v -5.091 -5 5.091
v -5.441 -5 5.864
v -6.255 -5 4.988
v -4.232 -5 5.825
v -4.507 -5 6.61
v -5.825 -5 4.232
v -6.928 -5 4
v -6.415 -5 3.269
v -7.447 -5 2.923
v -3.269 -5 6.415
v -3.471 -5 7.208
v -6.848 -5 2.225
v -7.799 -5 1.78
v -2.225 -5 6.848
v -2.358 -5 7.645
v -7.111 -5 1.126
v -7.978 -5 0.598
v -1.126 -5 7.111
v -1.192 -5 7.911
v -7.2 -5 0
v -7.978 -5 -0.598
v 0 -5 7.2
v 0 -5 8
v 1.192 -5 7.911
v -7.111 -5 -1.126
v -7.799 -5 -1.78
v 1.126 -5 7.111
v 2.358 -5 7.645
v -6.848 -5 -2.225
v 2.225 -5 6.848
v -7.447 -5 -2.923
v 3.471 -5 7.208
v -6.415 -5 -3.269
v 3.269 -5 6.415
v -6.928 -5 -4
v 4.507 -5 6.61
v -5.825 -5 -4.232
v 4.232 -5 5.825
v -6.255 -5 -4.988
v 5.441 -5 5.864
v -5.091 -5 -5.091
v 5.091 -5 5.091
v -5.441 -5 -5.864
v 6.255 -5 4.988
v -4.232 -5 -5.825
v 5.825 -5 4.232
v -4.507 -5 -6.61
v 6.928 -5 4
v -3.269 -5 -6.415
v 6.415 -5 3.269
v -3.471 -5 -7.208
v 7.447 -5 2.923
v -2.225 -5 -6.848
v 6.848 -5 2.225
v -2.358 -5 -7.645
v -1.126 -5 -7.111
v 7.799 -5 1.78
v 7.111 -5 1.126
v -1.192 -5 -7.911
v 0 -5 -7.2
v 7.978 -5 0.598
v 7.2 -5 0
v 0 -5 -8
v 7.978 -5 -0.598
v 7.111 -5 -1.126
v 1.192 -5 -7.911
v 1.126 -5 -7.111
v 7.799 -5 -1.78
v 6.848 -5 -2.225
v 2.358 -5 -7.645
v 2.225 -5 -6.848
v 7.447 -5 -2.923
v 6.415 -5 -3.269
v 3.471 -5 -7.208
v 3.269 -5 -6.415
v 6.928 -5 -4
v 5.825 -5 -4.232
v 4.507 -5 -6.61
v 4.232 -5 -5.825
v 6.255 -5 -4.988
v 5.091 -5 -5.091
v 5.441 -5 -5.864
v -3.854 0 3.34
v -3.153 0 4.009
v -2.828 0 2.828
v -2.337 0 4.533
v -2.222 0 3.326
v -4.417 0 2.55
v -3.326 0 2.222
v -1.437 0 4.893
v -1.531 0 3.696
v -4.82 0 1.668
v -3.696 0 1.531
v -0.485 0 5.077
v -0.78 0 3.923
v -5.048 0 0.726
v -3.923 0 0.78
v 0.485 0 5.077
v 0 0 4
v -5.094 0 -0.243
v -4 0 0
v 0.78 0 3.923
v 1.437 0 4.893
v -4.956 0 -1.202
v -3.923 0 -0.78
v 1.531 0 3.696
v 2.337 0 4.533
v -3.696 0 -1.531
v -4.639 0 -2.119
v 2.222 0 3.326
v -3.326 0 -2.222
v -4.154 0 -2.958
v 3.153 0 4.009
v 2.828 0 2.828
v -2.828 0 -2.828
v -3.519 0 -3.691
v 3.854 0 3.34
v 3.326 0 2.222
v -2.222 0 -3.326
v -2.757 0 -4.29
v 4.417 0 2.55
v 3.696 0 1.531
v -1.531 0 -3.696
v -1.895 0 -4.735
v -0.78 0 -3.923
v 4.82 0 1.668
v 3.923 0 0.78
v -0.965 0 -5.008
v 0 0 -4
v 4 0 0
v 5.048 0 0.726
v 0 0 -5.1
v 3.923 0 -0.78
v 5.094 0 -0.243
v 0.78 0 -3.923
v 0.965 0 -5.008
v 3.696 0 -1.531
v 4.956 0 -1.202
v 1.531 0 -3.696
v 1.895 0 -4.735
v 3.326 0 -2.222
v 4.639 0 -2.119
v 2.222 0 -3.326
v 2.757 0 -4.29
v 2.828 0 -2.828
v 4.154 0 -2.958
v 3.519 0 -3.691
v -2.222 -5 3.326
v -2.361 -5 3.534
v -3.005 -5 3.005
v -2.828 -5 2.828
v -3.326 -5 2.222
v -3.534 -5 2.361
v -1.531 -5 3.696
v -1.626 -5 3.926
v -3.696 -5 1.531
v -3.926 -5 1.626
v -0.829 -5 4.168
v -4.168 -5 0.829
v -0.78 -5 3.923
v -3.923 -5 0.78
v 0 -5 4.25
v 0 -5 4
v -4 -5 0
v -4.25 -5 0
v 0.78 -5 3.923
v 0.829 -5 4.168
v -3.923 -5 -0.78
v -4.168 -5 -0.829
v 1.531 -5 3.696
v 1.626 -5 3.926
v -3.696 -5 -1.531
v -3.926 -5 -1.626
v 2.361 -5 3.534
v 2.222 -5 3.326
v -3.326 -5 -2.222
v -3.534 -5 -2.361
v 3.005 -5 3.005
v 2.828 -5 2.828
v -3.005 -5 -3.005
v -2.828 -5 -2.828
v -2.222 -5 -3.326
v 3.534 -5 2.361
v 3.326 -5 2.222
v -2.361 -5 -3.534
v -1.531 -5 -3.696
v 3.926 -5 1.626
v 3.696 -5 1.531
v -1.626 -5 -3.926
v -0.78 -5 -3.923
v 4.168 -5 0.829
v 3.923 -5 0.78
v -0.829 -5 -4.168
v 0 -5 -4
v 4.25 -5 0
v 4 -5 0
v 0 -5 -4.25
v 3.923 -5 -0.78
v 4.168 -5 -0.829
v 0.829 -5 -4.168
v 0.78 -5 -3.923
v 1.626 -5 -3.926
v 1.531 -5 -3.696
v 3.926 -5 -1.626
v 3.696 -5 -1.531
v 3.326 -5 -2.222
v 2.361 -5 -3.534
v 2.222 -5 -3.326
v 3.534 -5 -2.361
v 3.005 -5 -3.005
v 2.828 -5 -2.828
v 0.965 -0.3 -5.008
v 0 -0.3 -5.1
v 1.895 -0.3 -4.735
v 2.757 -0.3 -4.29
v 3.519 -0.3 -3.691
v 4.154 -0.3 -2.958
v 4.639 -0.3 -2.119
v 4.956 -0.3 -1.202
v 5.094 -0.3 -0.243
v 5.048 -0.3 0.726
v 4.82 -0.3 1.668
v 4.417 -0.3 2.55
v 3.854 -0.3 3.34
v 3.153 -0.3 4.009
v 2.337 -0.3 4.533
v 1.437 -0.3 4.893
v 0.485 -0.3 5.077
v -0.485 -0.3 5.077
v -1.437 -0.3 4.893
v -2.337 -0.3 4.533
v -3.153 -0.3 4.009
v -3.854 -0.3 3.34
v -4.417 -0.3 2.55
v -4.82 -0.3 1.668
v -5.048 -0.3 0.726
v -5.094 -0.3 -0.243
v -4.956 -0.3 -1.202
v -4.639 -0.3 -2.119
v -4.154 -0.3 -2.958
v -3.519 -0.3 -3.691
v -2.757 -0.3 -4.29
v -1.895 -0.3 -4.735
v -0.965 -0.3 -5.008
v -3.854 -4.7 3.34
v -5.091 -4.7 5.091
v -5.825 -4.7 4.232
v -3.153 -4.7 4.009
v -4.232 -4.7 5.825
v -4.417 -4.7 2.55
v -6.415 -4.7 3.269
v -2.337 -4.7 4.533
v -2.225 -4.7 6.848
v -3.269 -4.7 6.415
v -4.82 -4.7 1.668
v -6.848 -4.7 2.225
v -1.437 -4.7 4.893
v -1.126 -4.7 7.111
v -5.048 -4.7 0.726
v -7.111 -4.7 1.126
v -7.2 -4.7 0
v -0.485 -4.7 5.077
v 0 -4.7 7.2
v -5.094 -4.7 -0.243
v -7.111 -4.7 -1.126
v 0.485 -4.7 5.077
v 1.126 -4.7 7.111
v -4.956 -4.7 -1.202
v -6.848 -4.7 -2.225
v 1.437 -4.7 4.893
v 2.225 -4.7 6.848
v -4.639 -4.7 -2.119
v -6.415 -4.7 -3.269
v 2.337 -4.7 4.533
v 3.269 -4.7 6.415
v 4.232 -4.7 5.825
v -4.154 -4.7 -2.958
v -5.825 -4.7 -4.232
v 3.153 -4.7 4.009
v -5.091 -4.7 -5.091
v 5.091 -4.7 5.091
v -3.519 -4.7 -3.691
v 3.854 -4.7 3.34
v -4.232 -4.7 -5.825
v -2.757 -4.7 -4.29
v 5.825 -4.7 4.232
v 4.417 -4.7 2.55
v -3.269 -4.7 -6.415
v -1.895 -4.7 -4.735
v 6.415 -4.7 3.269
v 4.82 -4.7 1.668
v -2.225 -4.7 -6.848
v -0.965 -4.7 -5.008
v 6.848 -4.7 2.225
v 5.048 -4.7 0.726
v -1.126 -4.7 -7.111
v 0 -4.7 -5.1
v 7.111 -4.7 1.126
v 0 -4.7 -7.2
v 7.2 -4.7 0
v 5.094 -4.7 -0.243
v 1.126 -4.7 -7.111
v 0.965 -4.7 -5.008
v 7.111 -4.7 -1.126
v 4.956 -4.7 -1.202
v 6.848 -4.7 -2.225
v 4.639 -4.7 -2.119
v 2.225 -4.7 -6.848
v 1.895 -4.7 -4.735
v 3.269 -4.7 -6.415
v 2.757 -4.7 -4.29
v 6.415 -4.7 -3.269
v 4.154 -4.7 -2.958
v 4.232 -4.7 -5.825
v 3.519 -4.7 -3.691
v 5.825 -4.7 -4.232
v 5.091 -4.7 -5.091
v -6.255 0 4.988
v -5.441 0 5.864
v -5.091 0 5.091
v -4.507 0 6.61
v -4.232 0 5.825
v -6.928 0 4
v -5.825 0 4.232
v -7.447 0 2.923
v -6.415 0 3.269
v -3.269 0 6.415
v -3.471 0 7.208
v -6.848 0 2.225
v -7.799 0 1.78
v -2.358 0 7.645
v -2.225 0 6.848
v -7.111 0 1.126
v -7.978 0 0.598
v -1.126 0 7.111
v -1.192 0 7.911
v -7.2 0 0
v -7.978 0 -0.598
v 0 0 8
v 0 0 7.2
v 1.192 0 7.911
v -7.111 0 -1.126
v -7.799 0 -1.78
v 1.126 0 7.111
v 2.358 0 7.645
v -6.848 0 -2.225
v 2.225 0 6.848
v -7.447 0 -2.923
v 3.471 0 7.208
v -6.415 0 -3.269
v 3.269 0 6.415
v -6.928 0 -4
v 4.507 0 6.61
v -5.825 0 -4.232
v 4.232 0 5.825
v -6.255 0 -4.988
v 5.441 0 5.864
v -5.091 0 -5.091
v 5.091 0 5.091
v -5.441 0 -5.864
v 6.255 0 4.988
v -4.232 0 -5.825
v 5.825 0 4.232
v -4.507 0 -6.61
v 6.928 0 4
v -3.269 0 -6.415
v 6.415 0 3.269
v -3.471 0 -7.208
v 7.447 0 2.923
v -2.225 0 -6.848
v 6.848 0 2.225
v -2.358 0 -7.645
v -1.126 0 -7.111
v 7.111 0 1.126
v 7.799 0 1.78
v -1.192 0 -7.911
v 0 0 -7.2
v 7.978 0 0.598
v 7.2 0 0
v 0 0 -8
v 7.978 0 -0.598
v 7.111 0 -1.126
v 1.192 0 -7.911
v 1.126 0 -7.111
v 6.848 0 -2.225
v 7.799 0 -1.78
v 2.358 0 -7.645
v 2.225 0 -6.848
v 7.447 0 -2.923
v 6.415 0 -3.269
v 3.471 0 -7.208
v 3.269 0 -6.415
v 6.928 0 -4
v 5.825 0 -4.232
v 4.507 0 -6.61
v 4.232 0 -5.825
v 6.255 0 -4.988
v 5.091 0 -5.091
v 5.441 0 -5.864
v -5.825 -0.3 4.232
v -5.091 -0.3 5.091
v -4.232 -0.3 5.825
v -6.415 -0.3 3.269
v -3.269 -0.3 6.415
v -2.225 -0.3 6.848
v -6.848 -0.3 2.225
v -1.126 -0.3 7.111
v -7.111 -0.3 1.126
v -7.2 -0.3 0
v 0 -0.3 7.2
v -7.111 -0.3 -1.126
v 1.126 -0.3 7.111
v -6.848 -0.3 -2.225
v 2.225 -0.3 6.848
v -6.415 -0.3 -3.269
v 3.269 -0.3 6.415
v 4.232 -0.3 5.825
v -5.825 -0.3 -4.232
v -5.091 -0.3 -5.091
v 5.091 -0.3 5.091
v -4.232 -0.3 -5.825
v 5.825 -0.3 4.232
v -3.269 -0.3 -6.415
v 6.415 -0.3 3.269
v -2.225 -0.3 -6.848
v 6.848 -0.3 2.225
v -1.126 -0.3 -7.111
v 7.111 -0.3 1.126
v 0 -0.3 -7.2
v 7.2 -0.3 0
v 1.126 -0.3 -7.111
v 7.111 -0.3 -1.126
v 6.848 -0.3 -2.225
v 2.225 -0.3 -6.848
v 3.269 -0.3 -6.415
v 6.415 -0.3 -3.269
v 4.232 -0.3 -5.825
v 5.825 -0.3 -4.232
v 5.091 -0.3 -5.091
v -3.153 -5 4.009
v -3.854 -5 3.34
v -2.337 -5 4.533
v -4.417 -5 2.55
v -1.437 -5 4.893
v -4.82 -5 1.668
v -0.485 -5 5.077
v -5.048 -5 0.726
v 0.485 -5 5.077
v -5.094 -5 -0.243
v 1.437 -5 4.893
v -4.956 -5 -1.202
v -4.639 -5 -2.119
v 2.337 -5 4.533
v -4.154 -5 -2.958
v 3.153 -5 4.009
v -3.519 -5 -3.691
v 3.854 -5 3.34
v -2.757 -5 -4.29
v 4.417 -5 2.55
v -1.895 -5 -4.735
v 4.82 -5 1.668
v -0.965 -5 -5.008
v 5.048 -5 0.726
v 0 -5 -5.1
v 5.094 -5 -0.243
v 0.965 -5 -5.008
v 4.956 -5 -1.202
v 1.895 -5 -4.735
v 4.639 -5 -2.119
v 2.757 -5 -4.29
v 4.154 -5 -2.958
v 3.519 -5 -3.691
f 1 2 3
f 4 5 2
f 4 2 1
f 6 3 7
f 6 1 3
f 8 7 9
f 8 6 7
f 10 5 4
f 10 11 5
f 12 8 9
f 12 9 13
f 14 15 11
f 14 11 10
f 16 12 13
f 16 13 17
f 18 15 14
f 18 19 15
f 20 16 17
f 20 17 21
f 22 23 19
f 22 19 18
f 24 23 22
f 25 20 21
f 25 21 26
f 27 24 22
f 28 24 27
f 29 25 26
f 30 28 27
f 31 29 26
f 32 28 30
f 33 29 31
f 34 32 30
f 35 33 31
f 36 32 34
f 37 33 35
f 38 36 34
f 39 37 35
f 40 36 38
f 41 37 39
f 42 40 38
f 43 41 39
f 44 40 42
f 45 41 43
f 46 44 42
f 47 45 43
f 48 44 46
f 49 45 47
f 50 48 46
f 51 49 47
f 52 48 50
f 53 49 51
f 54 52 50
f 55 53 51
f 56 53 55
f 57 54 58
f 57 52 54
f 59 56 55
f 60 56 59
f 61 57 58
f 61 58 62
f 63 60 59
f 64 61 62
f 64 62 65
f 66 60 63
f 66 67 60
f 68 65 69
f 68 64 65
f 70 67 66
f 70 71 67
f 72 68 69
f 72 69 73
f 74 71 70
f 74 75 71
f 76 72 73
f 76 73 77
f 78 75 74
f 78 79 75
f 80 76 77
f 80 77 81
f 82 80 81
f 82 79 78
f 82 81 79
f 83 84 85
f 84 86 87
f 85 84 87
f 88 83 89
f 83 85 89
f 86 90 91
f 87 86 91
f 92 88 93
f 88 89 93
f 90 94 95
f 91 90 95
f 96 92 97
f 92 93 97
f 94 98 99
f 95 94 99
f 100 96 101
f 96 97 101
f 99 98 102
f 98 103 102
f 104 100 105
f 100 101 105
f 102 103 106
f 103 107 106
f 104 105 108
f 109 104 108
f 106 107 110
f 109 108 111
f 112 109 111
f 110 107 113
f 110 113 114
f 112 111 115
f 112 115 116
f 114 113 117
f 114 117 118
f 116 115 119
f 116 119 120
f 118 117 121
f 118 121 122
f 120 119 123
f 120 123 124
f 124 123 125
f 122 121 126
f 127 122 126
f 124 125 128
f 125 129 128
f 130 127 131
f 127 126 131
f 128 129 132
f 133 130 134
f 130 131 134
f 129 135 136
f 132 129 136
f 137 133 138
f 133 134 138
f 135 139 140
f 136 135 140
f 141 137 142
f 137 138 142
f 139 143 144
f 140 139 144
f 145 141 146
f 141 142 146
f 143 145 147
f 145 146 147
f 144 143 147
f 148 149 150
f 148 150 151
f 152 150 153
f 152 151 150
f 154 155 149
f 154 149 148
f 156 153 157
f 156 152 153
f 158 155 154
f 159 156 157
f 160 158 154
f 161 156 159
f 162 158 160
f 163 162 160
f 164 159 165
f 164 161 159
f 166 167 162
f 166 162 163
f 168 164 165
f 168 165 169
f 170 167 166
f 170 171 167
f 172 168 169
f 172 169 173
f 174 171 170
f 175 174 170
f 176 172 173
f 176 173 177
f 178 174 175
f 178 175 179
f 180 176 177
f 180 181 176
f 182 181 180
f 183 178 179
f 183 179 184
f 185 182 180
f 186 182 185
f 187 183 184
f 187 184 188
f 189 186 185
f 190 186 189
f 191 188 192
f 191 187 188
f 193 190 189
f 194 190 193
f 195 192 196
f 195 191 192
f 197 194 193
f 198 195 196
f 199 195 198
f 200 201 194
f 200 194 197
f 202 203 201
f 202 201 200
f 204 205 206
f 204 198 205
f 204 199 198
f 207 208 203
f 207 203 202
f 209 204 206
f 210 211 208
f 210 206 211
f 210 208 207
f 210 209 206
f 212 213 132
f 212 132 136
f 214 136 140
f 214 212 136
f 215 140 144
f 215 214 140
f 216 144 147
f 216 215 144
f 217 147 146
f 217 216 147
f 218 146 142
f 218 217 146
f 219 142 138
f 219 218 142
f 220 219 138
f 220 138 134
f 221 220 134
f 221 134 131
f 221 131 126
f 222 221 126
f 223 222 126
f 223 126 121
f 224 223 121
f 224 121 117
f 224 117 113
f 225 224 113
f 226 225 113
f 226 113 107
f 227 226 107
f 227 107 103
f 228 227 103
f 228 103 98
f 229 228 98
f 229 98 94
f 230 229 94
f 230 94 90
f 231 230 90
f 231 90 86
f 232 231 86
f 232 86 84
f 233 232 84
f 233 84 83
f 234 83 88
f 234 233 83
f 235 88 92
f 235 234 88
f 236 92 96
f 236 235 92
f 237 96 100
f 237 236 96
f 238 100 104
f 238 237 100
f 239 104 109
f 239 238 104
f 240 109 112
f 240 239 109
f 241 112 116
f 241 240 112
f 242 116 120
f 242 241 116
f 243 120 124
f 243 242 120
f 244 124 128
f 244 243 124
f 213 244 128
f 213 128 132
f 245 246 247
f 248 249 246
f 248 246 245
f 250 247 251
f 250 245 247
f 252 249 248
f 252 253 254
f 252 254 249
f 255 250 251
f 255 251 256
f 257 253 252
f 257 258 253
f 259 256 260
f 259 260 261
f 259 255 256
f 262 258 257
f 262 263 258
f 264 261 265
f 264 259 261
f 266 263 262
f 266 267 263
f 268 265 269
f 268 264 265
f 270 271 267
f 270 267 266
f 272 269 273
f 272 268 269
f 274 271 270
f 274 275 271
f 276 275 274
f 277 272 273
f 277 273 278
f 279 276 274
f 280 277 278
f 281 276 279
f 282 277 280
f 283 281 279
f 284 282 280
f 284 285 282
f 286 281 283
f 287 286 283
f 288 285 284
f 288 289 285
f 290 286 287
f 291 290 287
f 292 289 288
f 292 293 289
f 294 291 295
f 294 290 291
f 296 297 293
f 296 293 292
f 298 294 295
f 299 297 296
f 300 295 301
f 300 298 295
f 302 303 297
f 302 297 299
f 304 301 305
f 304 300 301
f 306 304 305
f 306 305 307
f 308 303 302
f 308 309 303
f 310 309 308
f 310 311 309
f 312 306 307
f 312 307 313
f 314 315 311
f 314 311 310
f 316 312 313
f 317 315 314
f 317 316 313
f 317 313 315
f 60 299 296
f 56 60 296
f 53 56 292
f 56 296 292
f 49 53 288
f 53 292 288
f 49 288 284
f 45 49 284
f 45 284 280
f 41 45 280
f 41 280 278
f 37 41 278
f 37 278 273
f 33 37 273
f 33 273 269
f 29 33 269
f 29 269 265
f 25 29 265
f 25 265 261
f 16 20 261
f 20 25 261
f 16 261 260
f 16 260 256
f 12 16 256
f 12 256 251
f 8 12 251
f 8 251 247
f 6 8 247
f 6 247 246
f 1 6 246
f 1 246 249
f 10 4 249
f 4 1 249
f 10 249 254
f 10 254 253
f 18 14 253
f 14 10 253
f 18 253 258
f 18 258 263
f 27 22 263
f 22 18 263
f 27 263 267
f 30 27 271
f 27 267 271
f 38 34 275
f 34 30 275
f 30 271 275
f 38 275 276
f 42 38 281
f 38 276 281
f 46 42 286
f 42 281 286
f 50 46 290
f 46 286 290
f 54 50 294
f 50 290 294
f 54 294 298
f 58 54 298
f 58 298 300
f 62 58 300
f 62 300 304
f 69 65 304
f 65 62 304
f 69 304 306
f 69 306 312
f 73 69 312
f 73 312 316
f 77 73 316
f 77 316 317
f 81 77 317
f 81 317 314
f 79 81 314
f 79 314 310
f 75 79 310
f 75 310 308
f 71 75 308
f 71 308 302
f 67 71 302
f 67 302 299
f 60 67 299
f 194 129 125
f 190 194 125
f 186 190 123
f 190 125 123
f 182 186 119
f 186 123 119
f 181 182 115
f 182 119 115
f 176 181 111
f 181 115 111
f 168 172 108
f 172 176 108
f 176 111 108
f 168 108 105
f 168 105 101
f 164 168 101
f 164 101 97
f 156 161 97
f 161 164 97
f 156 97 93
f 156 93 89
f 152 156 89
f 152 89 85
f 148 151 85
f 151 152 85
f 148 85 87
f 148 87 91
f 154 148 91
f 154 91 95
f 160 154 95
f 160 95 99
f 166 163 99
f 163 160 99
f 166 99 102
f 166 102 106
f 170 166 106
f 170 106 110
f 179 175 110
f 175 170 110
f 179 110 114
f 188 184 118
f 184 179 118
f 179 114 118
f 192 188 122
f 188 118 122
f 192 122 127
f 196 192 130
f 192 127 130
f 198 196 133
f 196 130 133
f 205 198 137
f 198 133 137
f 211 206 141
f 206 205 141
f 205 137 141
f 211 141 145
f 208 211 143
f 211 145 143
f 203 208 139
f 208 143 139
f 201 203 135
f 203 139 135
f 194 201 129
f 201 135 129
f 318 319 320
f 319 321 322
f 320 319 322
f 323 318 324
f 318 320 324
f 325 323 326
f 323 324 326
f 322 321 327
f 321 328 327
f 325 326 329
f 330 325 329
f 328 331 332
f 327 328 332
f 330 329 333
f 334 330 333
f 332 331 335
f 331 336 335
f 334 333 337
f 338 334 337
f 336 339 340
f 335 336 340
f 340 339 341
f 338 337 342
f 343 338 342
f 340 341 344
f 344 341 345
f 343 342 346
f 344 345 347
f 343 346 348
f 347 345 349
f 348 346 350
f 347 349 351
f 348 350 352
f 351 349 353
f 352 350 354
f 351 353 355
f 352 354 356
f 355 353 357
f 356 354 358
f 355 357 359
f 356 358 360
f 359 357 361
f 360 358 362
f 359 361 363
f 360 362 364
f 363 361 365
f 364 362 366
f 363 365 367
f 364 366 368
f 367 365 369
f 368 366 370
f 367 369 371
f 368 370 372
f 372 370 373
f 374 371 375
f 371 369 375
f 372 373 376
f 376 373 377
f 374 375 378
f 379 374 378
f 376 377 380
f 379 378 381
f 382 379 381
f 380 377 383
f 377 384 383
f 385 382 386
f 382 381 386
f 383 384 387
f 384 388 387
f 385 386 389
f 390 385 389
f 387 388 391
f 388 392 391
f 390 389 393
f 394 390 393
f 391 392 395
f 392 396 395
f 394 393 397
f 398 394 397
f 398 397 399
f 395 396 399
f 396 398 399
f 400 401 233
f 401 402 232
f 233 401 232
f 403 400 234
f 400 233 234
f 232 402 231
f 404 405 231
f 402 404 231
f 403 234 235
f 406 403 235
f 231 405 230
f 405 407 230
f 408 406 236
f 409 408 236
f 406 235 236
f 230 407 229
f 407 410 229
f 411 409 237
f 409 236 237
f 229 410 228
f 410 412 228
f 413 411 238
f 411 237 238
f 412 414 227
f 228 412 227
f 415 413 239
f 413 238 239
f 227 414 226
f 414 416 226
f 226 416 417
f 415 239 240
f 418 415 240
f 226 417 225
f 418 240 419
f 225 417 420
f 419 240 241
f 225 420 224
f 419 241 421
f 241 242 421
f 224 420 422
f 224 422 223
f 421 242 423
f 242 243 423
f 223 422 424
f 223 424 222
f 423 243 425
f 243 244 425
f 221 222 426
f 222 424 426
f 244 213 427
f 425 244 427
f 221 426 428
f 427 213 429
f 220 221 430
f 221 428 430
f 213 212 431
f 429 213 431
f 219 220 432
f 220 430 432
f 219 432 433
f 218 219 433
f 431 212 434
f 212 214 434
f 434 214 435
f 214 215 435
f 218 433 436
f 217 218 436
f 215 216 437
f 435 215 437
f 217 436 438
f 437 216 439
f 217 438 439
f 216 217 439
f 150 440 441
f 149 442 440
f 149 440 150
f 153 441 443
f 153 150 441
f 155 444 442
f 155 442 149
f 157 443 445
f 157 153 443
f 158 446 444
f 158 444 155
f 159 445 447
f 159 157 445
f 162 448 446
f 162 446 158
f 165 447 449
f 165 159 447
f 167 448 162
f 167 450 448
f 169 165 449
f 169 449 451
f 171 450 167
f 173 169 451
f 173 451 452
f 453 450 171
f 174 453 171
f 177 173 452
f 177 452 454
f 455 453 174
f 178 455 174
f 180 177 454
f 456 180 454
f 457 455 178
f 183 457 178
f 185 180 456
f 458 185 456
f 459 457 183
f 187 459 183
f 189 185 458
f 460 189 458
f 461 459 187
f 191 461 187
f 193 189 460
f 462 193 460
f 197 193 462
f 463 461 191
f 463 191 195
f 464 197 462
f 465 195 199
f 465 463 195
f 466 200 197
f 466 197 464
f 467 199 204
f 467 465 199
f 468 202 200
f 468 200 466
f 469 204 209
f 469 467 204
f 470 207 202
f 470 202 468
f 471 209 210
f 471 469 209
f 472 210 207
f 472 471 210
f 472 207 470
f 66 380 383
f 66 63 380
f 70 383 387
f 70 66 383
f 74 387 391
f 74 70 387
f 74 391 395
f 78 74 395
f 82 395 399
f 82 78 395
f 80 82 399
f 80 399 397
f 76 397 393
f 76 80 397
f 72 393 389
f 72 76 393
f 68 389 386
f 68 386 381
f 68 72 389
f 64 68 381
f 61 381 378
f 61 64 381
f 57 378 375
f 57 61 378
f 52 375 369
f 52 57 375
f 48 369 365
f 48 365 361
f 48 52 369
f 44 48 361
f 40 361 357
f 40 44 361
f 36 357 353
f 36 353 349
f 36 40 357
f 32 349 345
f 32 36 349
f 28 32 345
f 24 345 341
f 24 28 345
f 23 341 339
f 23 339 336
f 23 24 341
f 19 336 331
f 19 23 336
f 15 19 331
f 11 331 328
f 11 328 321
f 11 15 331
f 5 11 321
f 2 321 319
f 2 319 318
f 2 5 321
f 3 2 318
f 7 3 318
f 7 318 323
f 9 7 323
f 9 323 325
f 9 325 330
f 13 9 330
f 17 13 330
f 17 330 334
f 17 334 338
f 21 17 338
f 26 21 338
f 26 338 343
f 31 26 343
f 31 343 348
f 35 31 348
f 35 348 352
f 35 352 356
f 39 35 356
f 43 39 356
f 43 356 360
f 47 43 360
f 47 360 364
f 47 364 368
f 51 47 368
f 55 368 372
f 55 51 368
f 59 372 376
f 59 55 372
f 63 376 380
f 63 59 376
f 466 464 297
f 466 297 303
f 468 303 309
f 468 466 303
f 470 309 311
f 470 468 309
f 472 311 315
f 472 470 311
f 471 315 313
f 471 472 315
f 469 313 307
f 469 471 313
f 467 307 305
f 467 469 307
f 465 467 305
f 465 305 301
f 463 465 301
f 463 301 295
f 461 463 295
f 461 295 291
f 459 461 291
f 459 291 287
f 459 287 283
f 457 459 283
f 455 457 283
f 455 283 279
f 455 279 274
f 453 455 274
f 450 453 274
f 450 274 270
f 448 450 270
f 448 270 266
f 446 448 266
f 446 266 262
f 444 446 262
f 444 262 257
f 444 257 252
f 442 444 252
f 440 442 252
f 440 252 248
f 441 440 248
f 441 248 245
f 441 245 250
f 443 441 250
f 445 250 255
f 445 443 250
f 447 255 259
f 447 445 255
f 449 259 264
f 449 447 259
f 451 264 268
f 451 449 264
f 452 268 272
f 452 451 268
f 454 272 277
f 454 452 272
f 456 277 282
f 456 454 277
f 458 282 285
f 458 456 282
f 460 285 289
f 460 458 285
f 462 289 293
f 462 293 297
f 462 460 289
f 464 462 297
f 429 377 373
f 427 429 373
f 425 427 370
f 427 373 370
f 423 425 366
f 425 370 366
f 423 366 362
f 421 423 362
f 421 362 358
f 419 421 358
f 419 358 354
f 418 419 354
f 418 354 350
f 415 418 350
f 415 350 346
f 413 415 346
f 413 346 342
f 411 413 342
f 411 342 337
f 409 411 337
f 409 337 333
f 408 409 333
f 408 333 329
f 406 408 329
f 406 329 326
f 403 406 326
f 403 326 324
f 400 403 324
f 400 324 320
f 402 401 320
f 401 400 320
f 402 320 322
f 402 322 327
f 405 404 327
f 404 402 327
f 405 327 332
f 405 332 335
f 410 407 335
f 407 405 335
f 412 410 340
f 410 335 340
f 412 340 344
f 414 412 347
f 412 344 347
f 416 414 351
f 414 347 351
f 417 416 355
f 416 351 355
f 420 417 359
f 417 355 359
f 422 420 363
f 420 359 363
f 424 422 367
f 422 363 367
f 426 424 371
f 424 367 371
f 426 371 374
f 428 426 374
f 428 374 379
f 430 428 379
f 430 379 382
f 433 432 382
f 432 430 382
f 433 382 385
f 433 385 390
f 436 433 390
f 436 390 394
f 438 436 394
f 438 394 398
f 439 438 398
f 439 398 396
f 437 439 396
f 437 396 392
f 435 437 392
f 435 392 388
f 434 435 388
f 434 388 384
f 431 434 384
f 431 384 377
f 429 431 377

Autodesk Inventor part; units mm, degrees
ref_plane "YZ Plane" through (0, 0, 0) normal (1, 0, 0) x (0, 1, 0)
ref_plane "XZ Plane" through (0, 0, 0) normal (0, 1, 0) x (-1, 0, 0)
ref_plane "XY Plane" through (0, 0, 0) normal (0, 0, 1) x (1, 0, 0)
sketch "Sketch1" plane through (0, 0, 0) normal (1, 0, 0) x (0, 1, 0)
  line L0 (-5, -4.25) -> (-5, -5.9)
  line L1 (0, -4) -> (0, -5.1)
  line L2 (0, -5.1) -> (-0.3, -5.1)
  line L3 (-0.3, -5.1) -> (-0.3, -7.2)
  line L4 (-0.3, -7.2) -> (0, -7.2)
  line L5 (0, -7.2) -> (0, -8)
  line L6 (0, -8) -> (-5, -8)
  line L7 (-5, -8) -> (-5, -7.2)
  line L8 (-5, -7.2) -> (-4.7, -7.2)
  line L9 (-4.7, -7.2) -> (-4.7, -5.1)
  line L10 (-4.7, -5.1) -> (-5, -5.1)
  line L11 (-5, -5.1) -> (-5, -4)
  line L12 (-5, -4) -> (0, -4)
  line L13 (0, 0) -> (-5.2831, 0)
revolve "Revolution1" add sketch "Sketch1" angle 360 about axis through (0, 0, 0) along (0, -1, 0)
properties part number "Ball Bearing 8 x 16 x 5" material "Stainless Steel"
